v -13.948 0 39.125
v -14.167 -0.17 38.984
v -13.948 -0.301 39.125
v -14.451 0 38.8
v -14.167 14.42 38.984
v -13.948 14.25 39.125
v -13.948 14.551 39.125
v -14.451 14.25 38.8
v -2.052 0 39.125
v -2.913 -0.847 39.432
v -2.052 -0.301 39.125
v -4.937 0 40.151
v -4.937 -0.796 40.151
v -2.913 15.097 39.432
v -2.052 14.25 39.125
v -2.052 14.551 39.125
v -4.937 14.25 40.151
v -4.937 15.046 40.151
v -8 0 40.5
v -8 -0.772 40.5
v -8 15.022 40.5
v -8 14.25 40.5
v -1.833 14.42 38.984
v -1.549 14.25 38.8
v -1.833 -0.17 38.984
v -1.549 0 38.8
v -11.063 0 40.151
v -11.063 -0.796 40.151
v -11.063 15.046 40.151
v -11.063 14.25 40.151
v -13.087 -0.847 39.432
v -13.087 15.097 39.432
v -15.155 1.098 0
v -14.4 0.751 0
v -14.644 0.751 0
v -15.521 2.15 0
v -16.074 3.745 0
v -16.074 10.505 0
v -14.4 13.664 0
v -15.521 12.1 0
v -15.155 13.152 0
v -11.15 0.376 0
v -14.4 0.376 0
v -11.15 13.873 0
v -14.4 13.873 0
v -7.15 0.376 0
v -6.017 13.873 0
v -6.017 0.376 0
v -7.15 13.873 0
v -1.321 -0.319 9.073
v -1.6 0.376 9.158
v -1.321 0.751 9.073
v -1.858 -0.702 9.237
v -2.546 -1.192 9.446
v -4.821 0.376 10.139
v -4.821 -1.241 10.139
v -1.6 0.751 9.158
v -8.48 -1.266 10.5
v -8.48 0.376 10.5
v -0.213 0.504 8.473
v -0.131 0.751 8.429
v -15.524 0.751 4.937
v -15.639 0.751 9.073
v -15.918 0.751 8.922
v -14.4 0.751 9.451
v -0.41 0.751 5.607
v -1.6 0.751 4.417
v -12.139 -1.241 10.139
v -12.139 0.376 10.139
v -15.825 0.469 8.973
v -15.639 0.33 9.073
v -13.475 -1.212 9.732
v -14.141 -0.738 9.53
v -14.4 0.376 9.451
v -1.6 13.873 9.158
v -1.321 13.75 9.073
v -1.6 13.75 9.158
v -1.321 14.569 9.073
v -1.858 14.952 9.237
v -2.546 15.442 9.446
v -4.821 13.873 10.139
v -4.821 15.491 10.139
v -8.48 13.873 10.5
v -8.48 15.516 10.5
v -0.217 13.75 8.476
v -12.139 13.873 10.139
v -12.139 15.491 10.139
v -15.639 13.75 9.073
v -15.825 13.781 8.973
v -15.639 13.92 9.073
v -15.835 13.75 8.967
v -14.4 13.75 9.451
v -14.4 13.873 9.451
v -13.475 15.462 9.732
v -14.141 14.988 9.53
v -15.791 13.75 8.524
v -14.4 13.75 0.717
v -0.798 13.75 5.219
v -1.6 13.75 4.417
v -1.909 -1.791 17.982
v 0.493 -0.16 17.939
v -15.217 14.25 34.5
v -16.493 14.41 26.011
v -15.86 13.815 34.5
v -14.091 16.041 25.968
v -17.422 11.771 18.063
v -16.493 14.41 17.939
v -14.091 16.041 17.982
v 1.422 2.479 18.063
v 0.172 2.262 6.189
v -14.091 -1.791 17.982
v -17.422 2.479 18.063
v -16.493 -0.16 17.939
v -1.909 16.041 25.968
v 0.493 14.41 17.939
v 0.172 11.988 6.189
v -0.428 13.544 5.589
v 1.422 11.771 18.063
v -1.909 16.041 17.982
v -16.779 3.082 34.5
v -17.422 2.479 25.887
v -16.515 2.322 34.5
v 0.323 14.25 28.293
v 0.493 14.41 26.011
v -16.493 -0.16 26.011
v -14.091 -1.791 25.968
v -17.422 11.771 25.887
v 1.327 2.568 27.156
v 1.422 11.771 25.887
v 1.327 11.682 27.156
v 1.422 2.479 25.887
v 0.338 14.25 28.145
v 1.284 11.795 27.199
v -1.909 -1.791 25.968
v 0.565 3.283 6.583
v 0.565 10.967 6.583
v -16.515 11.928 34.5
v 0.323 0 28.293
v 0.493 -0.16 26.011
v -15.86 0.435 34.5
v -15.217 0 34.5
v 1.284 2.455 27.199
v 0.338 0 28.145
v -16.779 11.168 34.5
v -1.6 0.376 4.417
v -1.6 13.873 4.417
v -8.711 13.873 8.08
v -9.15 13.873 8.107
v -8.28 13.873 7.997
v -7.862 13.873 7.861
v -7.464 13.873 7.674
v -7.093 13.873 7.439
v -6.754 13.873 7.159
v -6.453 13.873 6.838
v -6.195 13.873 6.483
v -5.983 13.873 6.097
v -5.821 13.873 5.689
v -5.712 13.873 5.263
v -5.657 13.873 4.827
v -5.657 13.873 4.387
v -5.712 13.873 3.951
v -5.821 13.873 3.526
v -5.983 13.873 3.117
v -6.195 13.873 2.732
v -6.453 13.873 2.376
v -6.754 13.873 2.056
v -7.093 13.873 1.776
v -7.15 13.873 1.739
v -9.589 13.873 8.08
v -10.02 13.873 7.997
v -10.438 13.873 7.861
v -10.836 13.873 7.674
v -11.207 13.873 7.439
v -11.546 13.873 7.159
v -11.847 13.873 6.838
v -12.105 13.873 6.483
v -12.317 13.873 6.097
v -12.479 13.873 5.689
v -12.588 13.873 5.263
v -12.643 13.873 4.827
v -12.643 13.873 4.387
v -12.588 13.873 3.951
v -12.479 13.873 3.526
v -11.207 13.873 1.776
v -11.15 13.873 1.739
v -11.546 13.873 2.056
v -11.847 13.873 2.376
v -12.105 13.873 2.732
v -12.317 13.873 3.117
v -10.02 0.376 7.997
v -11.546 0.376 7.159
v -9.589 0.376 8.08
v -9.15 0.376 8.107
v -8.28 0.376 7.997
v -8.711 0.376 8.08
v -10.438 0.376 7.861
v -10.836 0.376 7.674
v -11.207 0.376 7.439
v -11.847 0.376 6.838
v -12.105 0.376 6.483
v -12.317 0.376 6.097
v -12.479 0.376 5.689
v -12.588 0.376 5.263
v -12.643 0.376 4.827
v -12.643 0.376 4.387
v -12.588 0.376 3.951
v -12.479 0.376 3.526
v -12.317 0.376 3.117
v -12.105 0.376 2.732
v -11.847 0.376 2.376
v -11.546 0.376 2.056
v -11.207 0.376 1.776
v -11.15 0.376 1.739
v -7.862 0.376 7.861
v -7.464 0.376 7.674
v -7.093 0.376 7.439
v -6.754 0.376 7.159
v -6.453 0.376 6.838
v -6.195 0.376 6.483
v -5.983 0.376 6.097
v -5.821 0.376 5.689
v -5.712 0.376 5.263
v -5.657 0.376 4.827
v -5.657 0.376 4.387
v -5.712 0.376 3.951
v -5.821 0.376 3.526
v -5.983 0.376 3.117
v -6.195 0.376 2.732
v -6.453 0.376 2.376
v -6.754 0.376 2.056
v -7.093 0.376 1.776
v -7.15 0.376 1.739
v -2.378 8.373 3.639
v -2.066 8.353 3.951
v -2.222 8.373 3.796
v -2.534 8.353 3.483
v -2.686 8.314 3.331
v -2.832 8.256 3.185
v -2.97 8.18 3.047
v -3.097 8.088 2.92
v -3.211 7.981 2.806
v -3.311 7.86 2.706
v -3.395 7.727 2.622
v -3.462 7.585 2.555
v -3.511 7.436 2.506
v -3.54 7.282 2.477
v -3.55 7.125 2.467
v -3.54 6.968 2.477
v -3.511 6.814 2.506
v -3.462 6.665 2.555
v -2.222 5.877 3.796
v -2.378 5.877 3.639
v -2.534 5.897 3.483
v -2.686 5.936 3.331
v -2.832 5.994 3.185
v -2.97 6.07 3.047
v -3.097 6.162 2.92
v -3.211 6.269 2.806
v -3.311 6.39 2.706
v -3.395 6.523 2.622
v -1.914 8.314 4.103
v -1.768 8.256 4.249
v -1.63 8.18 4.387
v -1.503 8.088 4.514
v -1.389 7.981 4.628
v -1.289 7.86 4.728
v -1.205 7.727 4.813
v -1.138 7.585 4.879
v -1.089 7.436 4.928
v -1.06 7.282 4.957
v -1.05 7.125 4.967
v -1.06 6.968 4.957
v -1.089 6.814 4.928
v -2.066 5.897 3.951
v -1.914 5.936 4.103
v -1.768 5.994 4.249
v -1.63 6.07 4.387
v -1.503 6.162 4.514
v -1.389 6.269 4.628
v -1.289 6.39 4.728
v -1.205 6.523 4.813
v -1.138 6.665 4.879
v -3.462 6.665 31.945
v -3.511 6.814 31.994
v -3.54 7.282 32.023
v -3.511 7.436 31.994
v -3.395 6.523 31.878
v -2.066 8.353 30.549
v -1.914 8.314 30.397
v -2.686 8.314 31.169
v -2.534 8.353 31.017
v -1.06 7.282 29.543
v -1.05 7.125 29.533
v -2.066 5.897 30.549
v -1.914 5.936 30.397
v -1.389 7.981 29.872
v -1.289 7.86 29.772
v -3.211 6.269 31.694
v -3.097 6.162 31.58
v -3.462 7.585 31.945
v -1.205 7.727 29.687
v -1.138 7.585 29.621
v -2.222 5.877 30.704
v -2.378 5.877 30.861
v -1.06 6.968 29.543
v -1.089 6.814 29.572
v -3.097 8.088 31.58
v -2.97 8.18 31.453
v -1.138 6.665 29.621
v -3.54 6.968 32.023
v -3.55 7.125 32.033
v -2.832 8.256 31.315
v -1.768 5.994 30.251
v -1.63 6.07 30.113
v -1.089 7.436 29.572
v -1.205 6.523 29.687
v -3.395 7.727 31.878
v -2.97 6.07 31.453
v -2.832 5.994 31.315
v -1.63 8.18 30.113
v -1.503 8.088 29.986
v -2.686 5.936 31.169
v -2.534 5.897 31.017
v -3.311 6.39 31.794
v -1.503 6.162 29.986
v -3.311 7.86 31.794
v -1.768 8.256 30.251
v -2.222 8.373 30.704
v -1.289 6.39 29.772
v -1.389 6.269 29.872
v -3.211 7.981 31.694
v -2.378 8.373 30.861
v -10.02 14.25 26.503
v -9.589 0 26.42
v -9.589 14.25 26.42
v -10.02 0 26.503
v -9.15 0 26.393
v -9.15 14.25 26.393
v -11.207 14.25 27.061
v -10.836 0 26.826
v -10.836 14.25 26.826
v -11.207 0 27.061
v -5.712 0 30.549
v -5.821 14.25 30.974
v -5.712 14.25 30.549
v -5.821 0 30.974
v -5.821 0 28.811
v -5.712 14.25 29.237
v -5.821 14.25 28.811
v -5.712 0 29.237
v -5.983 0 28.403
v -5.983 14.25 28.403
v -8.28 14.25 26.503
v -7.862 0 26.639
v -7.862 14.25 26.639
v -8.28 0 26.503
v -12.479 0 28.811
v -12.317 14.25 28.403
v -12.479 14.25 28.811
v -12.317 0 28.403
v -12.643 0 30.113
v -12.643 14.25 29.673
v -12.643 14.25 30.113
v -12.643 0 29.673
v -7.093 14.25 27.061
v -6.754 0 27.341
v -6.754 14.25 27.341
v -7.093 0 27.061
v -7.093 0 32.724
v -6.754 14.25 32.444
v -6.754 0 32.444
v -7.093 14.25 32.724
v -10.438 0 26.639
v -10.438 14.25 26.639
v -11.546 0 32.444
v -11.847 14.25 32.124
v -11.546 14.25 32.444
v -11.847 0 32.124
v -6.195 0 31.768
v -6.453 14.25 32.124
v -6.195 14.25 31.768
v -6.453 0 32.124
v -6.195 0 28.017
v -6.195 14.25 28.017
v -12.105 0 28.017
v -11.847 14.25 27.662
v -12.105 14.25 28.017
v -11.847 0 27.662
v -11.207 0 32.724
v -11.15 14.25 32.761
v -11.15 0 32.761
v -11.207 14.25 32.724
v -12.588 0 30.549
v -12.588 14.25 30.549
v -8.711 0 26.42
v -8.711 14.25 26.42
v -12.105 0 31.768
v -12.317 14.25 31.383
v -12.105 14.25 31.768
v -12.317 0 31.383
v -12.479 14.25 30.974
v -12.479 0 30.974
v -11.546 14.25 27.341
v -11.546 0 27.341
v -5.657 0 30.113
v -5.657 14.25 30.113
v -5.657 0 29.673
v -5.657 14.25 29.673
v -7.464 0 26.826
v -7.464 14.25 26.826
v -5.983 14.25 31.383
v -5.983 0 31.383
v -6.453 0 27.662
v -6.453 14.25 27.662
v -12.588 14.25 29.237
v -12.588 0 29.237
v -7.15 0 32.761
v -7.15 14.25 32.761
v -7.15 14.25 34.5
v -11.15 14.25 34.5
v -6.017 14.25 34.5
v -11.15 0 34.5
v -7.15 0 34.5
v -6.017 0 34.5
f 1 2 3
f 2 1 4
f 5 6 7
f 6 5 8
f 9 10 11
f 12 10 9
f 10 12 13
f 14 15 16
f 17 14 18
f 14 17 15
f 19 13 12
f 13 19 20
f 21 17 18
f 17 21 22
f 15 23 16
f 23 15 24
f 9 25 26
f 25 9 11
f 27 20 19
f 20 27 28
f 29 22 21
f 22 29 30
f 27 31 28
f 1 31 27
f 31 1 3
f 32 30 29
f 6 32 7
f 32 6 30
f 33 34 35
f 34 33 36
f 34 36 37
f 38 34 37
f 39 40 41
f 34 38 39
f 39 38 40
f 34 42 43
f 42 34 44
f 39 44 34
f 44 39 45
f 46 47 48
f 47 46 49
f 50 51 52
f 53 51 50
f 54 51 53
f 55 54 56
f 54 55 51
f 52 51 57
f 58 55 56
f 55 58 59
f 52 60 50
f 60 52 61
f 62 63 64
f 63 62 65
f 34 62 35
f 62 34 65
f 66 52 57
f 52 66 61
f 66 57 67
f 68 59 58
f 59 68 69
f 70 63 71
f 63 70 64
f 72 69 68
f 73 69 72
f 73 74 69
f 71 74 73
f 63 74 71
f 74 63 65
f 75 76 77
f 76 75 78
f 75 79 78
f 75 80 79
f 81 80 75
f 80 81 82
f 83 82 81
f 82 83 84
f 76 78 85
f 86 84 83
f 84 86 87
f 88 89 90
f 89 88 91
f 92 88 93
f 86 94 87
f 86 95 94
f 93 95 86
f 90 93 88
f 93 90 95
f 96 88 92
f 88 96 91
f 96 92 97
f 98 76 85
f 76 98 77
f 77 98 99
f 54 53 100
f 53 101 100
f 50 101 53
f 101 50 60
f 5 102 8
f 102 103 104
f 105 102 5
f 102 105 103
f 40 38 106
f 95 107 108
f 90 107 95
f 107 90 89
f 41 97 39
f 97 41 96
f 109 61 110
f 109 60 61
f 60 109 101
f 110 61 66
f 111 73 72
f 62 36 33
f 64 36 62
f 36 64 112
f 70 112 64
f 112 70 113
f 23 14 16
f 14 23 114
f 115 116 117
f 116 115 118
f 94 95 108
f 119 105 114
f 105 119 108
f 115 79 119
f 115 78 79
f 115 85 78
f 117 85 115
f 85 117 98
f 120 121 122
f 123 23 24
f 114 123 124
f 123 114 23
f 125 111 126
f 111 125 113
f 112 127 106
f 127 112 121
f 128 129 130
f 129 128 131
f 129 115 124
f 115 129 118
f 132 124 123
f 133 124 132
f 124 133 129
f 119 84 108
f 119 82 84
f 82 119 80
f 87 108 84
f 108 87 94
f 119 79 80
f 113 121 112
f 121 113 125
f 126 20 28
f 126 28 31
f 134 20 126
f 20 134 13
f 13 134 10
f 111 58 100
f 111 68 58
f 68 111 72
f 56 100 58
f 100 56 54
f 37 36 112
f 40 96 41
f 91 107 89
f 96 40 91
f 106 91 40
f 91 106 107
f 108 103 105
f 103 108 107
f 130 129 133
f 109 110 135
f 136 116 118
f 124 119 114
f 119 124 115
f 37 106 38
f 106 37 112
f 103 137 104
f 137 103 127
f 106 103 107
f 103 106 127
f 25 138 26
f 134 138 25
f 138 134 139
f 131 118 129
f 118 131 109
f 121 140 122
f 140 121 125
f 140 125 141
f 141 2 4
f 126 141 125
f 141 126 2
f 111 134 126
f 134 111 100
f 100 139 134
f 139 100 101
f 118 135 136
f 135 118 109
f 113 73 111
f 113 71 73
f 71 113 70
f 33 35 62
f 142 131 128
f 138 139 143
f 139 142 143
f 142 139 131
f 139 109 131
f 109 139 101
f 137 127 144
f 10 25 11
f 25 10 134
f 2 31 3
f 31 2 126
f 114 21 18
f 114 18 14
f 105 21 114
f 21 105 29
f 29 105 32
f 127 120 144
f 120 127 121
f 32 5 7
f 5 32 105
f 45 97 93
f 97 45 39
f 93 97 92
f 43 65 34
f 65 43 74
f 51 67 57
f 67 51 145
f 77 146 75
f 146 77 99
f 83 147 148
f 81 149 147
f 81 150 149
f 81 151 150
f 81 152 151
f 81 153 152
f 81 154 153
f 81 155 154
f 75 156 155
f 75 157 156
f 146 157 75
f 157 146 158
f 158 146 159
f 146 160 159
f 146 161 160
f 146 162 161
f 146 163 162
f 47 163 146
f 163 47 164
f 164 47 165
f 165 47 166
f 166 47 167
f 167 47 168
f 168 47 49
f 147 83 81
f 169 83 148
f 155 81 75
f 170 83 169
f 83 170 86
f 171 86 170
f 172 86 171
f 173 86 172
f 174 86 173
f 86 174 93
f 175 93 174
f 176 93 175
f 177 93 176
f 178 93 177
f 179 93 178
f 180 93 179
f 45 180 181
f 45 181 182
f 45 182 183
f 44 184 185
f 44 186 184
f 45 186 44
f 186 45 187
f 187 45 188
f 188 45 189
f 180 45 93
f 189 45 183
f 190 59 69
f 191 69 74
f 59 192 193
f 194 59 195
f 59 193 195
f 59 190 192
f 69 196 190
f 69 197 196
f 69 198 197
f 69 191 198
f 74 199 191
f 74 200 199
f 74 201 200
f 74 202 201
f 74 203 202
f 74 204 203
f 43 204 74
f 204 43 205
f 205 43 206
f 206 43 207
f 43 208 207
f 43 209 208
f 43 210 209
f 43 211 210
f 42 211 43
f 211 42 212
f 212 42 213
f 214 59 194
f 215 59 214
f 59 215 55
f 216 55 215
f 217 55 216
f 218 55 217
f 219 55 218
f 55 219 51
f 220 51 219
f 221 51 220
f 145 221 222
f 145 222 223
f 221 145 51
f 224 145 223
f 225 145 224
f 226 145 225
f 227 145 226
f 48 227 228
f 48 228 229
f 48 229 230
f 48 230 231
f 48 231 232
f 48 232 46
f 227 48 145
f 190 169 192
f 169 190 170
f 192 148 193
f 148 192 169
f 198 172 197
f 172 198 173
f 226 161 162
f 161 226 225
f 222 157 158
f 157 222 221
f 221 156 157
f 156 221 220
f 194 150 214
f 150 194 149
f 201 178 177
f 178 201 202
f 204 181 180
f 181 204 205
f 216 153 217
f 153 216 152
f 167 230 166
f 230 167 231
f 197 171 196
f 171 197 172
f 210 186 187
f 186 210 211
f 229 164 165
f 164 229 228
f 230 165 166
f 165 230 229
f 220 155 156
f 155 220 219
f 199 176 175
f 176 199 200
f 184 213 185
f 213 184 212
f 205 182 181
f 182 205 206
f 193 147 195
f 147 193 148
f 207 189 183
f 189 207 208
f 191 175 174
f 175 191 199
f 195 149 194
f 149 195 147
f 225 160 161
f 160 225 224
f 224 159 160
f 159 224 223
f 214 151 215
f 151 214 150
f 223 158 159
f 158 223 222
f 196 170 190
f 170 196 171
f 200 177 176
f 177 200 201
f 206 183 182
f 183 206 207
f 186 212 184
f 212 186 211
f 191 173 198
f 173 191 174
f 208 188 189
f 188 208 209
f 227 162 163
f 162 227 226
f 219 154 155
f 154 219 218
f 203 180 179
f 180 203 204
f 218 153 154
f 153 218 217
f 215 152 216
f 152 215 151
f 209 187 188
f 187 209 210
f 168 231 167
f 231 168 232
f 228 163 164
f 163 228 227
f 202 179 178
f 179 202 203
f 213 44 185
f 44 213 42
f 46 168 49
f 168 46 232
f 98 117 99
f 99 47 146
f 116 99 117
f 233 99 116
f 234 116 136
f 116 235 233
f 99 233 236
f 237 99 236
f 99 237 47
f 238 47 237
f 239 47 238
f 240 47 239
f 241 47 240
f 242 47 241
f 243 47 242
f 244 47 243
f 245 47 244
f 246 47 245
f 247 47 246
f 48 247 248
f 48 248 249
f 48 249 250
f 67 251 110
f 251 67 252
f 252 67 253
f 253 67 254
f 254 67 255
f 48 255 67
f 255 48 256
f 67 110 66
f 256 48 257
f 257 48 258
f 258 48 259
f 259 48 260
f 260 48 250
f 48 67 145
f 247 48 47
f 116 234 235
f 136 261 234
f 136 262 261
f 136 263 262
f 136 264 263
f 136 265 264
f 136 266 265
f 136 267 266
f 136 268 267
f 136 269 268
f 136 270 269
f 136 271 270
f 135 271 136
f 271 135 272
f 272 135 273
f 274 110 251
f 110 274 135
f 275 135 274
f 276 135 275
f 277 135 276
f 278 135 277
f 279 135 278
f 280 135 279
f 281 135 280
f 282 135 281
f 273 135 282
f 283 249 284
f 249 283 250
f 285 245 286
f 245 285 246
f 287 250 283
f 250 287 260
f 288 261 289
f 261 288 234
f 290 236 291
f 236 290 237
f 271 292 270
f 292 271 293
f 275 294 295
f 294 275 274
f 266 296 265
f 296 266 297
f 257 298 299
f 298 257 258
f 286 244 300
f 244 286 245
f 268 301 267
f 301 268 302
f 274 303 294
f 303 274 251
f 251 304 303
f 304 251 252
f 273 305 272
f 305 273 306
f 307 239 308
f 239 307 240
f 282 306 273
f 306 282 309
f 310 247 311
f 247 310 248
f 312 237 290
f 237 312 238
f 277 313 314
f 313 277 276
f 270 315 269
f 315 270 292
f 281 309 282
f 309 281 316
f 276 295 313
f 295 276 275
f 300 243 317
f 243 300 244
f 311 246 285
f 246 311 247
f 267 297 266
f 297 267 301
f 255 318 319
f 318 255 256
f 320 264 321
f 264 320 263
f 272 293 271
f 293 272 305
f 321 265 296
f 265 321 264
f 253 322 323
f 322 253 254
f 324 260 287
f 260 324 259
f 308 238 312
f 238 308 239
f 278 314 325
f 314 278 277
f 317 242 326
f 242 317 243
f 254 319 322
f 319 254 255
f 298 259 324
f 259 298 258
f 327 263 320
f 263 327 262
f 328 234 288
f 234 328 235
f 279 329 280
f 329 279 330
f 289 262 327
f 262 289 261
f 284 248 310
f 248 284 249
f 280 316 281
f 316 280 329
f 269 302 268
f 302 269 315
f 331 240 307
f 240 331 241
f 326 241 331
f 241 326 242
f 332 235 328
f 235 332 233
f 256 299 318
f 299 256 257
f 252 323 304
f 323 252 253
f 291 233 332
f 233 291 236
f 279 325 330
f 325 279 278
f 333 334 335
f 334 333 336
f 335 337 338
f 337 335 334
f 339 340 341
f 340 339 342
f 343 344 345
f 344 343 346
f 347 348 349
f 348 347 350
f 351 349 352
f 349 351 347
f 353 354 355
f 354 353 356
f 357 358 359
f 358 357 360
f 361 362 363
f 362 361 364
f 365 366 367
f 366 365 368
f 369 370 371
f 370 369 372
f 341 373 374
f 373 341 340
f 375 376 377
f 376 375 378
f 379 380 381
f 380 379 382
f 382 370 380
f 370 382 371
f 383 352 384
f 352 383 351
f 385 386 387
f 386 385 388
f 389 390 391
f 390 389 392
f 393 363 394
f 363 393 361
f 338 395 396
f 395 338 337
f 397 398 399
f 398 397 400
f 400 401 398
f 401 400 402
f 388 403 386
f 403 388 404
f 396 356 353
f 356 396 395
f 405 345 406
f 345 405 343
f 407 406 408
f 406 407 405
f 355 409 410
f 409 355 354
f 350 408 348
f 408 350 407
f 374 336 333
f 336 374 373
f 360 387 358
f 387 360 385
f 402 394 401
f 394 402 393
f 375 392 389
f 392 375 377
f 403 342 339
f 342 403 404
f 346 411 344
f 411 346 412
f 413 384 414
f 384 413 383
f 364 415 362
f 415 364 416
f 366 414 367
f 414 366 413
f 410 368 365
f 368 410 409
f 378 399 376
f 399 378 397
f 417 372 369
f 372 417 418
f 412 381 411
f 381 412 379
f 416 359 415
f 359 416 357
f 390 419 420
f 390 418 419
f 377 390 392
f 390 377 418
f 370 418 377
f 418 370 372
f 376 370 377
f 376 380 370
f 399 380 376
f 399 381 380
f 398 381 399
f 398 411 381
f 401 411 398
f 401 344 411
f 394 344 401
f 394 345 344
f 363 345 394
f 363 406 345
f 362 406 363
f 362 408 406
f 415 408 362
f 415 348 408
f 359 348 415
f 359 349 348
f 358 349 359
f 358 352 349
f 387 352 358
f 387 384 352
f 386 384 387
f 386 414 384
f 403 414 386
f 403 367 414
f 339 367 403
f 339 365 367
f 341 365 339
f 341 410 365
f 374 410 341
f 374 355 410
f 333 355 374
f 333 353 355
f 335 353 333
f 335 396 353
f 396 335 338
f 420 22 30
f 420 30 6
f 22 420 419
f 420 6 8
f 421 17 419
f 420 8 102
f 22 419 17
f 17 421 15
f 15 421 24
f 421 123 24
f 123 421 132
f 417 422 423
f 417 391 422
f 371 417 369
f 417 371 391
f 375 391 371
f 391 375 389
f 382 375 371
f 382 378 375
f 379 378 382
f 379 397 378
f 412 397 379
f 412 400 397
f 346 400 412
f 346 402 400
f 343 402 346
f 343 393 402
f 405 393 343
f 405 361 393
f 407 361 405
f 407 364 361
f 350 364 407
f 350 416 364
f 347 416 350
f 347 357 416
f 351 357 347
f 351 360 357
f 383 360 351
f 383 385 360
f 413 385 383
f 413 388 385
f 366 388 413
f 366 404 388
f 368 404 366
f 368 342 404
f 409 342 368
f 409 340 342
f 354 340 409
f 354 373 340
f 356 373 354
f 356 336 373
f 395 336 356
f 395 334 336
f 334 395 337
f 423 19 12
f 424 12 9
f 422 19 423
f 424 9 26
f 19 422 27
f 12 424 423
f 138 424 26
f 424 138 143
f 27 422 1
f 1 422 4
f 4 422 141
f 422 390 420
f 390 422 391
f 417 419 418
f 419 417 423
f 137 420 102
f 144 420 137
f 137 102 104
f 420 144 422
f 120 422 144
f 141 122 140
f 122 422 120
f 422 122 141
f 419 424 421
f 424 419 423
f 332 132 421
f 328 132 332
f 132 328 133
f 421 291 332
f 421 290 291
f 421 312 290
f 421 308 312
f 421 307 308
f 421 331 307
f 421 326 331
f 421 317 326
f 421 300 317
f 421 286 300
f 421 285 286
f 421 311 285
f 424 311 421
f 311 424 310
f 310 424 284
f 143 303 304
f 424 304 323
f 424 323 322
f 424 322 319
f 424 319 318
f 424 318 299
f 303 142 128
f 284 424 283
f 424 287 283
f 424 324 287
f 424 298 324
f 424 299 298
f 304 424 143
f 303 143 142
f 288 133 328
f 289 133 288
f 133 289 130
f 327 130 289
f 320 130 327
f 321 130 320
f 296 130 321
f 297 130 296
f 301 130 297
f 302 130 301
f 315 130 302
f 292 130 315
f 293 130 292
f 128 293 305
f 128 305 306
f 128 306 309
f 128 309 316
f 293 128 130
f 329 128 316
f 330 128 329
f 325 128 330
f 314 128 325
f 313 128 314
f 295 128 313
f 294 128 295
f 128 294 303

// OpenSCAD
// file: ../config.scad
/**
 * Configuration settings for Flexy Beast, required to generate correctly sized STLs of the printed parts. See the Configuration File Assembly instructions to set this up.
 * @id config_file
 * @name Configuration File
 * @category Prerequisites!
 * @step Open config.scad in your favorite text editor.
 * @step As per the normal Cyborg Beast instructions, measure the width of the knuckles in the non-affected hand and convert to millimeters.
 * @step Add 5 to that result and then divide by 55.
 * @step Replace the x-, y-, and zScaleFactor variables in config.scad with that number.
 * @step If desired, adjust the proportions of the hand by changing those variables individually. xScaleFactor controls the width of the hand, yScaleFactor controls the length, and zScaleFactor controls the height.
 * @step Open assembly.scad in OpenSCAD to check that the flexy joint holes are not too large for the hand (should only be necessary for small children). If necessary, reduce the jointDia and jointThick variables. jointDia=5 and jointThick=2 is a good amount for smaller hands.
 * @step Set the fingerPads variable to true or false depending on whether you want to cast silicone finger pads for improved grip.
 * @step Open palm.scad, finger_base.scad, finger_tip.scad, and thumb_tip.scad in OpenSCAD, render each part (F6), and export as STL, then print. Suggested print settings are 0.2mm or smaller layer height, 3 perimeters, and 25% rectilinear or hexagonal infill.
 */

knuckleR = 4.85;
knucklePadding = 0.5;
knuckleW = 9.5;
wristH = 10;
palmH = 20;
palmW = 64;
th = 3;
fn = 32;

//flexy joint parameters
jointDia = 7;
jointThick = 4;

//finger pad settings
fingerPads = true; //whether or not to hollow the finger tips slightly for molding pads

//desired scale factor for hand based on the standard Cyborg Beast/Robohand sizing guide
xScaleFactor = 1.5; // [1.05:1.60]
yScaleFactor = 1.5; // [1.05:1.60]
zScaleFactor = 1.6; // [1.05:1.60]
// main file
include <../config.scad>

rotate([0,-90,0]) fingerbase();

/**
 * Proximal phalanx for all digits (fingers and thumb) - rendered from parts/finger_base.scad
 * @id finger_base
 * @name Finger Base
 * @category Printed
 */

//	Base segment of finger, can be lengthened
module fingerbase(length=23, proximalHole=true, distalHole=true)
{
	difference() {
		scale([yScaleFactor,xScaleFactor,zScaleFactor]) {
			fingerbasesolid(length);
		}
		if(proximalHole) {
			translate([0,knucklePadding/2 * xScaleFactor,0]) fingerhardwarecutouts(jointDia, jointThick, knuckleW=knuckleW-knucklePadding, fingerLen=length);
		}
		if (distalHole) {
			translate([length * yScaleFactor,0,0]) mirror([1,0,0]) fingerhardwarecutouts(jointDia, jointThick, knuckleW=knuckleW, fingerLen=length);
		}
	}


	
}

module fingerhardwarecutouts(jointDia,jointThick,knuckleW,fingerLen,holeCutoff=100) {
	//slot for flex joint
	translate([7 - (15/jointDia),0,6*zScaleFactor - (1.8/jointThick)]) {
		rotate([90,0,0]) translate([-0.25,0,-knuckleW*xScaleFactor]) cylinder(d=jointDia, h=knuckleW*xScaleFactor, $fn=50);
		translate([-25,(knuckleW*xScaleFactor) / 2,0]) cube([50,knuckleW*xScaleFactor,jointThick], center=true);
	}
	//cubic parts
	translate([-100,0,0]) cube([100,knuckleW*xScaleFactor,100]);
	translate([-13/zScaleFactor,0,0]) rotate([0,45,0]) translate([-50,0,0]) cube([100,knuckleW * xScaleFactor, 10]);

	//channel for string/tendon
	translate([-fingerLen/2 * yScaleFactor, knuckleW/2 * xScaleFactor, 2.3]) rotate([0,90,0]) cylinder(d=2.5, h=holeCutoff, $fn=50);
}

//	base segment of finger, solid
module fingerbasesolid(length=50, cutout=true) {
	difference() {
		//cubic part
		translate([0,0.001 + knucklePadding/2,1]) cube([length, knuckleW - knucklePadding - 0.002, 8]);
	}
	
	//cylindrical-ish part around finger
	intersection() {
		//overly large shape to get the cross section in the XZ plane from
		difference() {
			union() {
				translate([length-4,-5,5]) rotate([-90,0,0]) cylinder(r=8,h=knuckleW + 10);
				translate([0,-5,-5]) cube([length,knuckleW + 10,20]);
			}
			//cutout for the side "guards" of the previous knuckle
			if(cutout) {
				translate([-4,-knuckleW+0.001,5.3]) rotate([-90,0,0]) cylinder(r=11,h=10);
				translate([-4,knuckleW - knucklePadding*(1/xScaleFactor),5.3]) rotate([-90,0,0]) cylinder(r=11,h=10);
			}
		}

		hull() {
			for(i=[-1,1], j=[-1,1]) {
				//angled cylinders to provide the outer shape of the finger
				translate([length/10,i*2.4 + knuckleW/2,j*2.2 + 5]) rotate([i*j*-4,j*86,0]) cylinder(d=6,h=20,center=true);
				translate([length+4, i*2.4 + knuckleW/2, j*2.2 + 5]) rotate([i*j*-4,j*-86,0]) cylinder(d=6,h=20,center=true);
			}
		}
	}
}
